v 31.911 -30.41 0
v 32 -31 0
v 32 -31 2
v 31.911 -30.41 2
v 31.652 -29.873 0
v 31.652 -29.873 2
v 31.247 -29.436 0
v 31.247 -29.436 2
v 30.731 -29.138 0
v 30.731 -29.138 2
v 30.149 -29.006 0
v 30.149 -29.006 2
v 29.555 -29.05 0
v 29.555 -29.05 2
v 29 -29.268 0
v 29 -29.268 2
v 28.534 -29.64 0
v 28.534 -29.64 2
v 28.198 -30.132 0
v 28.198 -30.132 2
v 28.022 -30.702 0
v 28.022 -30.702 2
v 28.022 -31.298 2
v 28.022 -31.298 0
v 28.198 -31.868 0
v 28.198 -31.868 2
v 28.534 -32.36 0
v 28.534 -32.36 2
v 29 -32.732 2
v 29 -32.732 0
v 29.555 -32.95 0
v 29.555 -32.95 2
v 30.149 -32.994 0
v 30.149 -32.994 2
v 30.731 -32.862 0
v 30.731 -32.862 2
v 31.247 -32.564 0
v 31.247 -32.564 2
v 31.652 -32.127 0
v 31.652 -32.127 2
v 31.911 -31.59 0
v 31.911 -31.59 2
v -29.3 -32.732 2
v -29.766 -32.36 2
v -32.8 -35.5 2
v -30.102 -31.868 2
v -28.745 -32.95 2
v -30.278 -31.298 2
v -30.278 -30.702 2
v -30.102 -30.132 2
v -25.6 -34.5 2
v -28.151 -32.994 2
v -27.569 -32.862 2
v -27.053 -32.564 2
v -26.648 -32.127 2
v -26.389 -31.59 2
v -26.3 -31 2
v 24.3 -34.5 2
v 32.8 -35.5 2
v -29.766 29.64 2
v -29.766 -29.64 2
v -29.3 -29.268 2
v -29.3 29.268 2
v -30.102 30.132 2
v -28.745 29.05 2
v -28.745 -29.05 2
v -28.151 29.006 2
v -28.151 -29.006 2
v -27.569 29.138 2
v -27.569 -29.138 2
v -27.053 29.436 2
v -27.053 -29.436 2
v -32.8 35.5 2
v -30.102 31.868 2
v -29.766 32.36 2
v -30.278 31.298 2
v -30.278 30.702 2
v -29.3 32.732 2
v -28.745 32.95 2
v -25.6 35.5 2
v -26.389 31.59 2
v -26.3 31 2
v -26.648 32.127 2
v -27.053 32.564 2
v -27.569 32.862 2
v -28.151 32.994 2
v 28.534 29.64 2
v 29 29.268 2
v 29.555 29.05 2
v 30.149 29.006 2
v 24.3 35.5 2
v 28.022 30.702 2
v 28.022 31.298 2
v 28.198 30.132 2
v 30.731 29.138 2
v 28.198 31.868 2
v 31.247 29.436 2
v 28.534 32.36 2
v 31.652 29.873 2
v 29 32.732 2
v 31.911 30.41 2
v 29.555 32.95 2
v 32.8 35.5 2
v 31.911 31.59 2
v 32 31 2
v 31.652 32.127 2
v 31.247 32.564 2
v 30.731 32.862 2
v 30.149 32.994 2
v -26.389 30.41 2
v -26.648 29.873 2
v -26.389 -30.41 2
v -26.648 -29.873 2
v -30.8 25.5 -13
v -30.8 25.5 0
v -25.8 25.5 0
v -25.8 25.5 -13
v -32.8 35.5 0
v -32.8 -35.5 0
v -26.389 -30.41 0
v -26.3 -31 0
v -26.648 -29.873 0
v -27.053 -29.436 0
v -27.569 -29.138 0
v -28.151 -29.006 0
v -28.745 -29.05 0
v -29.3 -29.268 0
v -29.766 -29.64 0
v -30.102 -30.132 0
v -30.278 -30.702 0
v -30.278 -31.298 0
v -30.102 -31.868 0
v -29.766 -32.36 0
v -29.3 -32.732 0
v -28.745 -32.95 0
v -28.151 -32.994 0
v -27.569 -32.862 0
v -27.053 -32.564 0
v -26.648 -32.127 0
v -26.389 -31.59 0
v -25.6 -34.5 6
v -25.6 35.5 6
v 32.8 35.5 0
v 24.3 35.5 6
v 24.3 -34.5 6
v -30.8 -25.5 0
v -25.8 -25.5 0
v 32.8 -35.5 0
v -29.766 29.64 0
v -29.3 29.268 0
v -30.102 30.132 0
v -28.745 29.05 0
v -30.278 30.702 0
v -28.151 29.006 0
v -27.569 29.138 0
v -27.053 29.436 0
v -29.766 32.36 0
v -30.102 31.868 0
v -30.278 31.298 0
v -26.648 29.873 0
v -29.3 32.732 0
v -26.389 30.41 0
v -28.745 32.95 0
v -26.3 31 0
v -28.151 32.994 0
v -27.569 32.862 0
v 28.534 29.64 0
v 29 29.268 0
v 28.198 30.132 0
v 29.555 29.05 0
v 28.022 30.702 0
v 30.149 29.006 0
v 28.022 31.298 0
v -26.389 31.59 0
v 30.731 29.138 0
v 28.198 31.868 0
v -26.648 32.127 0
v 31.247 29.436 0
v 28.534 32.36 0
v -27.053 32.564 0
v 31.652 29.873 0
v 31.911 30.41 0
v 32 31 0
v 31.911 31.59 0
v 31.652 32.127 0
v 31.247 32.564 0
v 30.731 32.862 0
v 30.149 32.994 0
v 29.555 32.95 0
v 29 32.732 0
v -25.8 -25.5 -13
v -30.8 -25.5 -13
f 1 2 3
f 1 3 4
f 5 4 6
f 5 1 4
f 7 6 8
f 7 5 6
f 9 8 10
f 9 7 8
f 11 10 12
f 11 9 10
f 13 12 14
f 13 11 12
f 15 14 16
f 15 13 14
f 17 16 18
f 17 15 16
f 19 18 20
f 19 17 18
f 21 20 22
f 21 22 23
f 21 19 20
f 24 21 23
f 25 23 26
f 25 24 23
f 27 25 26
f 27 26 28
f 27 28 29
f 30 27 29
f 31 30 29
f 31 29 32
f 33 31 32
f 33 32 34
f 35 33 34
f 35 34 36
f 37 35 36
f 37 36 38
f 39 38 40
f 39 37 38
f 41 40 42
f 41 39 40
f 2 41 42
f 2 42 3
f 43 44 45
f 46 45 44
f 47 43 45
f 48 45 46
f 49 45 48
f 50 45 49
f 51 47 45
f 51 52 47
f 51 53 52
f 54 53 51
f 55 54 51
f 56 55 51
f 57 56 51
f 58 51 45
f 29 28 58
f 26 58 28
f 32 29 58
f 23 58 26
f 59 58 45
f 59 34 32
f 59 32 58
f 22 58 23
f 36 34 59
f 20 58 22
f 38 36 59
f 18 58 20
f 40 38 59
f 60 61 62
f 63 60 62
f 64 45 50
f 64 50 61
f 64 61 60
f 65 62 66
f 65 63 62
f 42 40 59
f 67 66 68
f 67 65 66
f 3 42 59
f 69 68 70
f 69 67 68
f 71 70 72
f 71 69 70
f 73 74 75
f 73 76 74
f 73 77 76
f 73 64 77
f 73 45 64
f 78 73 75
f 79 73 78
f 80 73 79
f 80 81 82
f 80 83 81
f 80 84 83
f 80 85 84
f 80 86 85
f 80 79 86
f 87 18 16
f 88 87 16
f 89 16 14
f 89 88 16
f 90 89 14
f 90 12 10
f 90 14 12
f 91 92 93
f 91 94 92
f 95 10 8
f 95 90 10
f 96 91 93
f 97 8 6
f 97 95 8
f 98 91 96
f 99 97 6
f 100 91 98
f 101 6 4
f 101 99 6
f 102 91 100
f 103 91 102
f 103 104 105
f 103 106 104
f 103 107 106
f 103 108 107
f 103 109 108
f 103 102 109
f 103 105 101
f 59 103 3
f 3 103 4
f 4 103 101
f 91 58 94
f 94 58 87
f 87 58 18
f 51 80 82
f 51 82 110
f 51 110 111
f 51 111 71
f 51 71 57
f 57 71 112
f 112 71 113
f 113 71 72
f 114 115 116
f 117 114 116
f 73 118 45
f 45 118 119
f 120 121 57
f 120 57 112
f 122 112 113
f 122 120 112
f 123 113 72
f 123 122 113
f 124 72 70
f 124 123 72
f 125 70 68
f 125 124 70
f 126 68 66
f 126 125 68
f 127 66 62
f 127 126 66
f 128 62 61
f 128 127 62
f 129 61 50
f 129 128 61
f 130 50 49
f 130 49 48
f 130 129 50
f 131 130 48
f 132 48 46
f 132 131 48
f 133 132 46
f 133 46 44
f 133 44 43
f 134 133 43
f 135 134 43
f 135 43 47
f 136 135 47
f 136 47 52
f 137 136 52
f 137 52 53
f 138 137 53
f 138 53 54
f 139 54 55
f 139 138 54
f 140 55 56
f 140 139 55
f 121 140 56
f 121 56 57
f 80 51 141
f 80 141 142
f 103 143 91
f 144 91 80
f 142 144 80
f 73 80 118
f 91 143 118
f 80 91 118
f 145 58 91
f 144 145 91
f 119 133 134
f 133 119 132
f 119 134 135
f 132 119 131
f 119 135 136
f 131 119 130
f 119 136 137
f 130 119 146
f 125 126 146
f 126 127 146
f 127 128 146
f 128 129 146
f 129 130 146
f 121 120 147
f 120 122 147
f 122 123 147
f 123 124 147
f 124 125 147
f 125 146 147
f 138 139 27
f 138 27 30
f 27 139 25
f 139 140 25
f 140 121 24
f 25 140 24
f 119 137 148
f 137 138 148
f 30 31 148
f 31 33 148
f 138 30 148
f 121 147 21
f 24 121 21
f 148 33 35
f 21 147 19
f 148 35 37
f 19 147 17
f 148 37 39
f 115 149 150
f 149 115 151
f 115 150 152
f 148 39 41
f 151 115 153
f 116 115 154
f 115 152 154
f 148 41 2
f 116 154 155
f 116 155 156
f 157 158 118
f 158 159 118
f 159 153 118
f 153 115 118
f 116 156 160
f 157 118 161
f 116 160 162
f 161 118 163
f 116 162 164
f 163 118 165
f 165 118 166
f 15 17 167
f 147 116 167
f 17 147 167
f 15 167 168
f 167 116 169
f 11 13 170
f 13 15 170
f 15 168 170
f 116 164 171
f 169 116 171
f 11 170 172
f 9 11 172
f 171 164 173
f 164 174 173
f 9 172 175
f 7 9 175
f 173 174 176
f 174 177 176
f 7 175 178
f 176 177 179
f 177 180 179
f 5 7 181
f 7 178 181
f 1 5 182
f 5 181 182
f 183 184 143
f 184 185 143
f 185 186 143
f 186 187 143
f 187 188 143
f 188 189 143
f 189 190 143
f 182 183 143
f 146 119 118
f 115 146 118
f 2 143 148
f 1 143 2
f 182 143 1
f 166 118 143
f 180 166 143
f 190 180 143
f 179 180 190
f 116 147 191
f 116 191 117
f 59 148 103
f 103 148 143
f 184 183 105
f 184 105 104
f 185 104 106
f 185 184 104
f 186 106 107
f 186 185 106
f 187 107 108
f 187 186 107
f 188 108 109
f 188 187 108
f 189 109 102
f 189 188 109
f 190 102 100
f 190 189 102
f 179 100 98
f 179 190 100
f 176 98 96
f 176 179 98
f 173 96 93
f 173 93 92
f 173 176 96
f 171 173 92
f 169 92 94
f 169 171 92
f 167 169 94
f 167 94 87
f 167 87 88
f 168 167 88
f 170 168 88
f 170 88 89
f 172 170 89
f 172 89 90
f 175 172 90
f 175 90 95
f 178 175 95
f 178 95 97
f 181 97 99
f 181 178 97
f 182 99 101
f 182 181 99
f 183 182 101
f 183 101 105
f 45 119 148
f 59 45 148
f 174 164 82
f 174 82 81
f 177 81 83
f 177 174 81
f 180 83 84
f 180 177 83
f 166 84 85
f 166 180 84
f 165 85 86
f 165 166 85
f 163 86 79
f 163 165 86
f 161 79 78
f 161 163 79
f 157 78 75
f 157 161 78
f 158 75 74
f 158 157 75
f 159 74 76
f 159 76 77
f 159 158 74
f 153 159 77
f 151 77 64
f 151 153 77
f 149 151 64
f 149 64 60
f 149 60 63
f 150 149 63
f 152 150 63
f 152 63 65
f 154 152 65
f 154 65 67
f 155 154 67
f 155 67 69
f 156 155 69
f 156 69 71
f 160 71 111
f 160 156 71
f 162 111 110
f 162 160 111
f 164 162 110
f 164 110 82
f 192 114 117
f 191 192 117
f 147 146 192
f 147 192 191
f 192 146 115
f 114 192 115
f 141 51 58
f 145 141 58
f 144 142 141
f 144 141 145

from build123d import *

# Parameters (mm, degrees)
F0_R     = 2
F0_W     = 5
F0_H     = 51
F0_W_2   = 49.9
F0_H_2   = 70
F1_DEPTH = 2
F2_DEPTH = 6
F3_DEPTH = 13


with BuildPart() as f1:
    # F0 (on Top) → F1 (new body)
    with BuildSketch(Plane.XY):
        Polygon((-25.6, 35.5), (-32.8, 35.5), (-32.8, -35.5), (32.8, -35.5), (32.8, 35.5), (24.3, 35.5), (24.3, -34.5), (-25.6, -34.5), align=None)
        with Locations((-28.3, -31)):
            Circle(F0_R, mode=Mode.SUBTRACT)
        with Locations((30, -31)):
            Circle(F0_R, mode=Mode.SUBTRACT)
        with Locations((-28.3, 0)):
            Rectangle(F0_W, F0_H, mode=Mode.SUBTRACT)
        with Locations((-28.3, 31)):
            Circle(F0_R, mode=Mode.SUBTRACT)
        with Locations((30, 31)):
            Circle(F0_R, mode=Mode.SUBTRACT)
        with Locations((-0.65, 0.5)):
            Rectangle(F0_W_2, F0_H_2)
        with Locations((-28.3, 0)):
            Rectangle(F0_W, F0_H)
    extrude(amount=F1_DEPTH)

    # F0 (on Top) → F2 (join)
    with BuildSketch(Plane.XY):
        with Locations((-0.65, 0.5)):
            Rectangle(F0_W_2, F0_H_2)
    extrude(amount=F2_DEPTH)

    # F0 (on Top) → F3 (join)
    with BuildSketch(Plane.XY):
        with Locations((-28.3, 0)):
            Rectangle(F0_W, F0_H)
    extrude(amount=-F3_DEPTH)


solid = f1.part
